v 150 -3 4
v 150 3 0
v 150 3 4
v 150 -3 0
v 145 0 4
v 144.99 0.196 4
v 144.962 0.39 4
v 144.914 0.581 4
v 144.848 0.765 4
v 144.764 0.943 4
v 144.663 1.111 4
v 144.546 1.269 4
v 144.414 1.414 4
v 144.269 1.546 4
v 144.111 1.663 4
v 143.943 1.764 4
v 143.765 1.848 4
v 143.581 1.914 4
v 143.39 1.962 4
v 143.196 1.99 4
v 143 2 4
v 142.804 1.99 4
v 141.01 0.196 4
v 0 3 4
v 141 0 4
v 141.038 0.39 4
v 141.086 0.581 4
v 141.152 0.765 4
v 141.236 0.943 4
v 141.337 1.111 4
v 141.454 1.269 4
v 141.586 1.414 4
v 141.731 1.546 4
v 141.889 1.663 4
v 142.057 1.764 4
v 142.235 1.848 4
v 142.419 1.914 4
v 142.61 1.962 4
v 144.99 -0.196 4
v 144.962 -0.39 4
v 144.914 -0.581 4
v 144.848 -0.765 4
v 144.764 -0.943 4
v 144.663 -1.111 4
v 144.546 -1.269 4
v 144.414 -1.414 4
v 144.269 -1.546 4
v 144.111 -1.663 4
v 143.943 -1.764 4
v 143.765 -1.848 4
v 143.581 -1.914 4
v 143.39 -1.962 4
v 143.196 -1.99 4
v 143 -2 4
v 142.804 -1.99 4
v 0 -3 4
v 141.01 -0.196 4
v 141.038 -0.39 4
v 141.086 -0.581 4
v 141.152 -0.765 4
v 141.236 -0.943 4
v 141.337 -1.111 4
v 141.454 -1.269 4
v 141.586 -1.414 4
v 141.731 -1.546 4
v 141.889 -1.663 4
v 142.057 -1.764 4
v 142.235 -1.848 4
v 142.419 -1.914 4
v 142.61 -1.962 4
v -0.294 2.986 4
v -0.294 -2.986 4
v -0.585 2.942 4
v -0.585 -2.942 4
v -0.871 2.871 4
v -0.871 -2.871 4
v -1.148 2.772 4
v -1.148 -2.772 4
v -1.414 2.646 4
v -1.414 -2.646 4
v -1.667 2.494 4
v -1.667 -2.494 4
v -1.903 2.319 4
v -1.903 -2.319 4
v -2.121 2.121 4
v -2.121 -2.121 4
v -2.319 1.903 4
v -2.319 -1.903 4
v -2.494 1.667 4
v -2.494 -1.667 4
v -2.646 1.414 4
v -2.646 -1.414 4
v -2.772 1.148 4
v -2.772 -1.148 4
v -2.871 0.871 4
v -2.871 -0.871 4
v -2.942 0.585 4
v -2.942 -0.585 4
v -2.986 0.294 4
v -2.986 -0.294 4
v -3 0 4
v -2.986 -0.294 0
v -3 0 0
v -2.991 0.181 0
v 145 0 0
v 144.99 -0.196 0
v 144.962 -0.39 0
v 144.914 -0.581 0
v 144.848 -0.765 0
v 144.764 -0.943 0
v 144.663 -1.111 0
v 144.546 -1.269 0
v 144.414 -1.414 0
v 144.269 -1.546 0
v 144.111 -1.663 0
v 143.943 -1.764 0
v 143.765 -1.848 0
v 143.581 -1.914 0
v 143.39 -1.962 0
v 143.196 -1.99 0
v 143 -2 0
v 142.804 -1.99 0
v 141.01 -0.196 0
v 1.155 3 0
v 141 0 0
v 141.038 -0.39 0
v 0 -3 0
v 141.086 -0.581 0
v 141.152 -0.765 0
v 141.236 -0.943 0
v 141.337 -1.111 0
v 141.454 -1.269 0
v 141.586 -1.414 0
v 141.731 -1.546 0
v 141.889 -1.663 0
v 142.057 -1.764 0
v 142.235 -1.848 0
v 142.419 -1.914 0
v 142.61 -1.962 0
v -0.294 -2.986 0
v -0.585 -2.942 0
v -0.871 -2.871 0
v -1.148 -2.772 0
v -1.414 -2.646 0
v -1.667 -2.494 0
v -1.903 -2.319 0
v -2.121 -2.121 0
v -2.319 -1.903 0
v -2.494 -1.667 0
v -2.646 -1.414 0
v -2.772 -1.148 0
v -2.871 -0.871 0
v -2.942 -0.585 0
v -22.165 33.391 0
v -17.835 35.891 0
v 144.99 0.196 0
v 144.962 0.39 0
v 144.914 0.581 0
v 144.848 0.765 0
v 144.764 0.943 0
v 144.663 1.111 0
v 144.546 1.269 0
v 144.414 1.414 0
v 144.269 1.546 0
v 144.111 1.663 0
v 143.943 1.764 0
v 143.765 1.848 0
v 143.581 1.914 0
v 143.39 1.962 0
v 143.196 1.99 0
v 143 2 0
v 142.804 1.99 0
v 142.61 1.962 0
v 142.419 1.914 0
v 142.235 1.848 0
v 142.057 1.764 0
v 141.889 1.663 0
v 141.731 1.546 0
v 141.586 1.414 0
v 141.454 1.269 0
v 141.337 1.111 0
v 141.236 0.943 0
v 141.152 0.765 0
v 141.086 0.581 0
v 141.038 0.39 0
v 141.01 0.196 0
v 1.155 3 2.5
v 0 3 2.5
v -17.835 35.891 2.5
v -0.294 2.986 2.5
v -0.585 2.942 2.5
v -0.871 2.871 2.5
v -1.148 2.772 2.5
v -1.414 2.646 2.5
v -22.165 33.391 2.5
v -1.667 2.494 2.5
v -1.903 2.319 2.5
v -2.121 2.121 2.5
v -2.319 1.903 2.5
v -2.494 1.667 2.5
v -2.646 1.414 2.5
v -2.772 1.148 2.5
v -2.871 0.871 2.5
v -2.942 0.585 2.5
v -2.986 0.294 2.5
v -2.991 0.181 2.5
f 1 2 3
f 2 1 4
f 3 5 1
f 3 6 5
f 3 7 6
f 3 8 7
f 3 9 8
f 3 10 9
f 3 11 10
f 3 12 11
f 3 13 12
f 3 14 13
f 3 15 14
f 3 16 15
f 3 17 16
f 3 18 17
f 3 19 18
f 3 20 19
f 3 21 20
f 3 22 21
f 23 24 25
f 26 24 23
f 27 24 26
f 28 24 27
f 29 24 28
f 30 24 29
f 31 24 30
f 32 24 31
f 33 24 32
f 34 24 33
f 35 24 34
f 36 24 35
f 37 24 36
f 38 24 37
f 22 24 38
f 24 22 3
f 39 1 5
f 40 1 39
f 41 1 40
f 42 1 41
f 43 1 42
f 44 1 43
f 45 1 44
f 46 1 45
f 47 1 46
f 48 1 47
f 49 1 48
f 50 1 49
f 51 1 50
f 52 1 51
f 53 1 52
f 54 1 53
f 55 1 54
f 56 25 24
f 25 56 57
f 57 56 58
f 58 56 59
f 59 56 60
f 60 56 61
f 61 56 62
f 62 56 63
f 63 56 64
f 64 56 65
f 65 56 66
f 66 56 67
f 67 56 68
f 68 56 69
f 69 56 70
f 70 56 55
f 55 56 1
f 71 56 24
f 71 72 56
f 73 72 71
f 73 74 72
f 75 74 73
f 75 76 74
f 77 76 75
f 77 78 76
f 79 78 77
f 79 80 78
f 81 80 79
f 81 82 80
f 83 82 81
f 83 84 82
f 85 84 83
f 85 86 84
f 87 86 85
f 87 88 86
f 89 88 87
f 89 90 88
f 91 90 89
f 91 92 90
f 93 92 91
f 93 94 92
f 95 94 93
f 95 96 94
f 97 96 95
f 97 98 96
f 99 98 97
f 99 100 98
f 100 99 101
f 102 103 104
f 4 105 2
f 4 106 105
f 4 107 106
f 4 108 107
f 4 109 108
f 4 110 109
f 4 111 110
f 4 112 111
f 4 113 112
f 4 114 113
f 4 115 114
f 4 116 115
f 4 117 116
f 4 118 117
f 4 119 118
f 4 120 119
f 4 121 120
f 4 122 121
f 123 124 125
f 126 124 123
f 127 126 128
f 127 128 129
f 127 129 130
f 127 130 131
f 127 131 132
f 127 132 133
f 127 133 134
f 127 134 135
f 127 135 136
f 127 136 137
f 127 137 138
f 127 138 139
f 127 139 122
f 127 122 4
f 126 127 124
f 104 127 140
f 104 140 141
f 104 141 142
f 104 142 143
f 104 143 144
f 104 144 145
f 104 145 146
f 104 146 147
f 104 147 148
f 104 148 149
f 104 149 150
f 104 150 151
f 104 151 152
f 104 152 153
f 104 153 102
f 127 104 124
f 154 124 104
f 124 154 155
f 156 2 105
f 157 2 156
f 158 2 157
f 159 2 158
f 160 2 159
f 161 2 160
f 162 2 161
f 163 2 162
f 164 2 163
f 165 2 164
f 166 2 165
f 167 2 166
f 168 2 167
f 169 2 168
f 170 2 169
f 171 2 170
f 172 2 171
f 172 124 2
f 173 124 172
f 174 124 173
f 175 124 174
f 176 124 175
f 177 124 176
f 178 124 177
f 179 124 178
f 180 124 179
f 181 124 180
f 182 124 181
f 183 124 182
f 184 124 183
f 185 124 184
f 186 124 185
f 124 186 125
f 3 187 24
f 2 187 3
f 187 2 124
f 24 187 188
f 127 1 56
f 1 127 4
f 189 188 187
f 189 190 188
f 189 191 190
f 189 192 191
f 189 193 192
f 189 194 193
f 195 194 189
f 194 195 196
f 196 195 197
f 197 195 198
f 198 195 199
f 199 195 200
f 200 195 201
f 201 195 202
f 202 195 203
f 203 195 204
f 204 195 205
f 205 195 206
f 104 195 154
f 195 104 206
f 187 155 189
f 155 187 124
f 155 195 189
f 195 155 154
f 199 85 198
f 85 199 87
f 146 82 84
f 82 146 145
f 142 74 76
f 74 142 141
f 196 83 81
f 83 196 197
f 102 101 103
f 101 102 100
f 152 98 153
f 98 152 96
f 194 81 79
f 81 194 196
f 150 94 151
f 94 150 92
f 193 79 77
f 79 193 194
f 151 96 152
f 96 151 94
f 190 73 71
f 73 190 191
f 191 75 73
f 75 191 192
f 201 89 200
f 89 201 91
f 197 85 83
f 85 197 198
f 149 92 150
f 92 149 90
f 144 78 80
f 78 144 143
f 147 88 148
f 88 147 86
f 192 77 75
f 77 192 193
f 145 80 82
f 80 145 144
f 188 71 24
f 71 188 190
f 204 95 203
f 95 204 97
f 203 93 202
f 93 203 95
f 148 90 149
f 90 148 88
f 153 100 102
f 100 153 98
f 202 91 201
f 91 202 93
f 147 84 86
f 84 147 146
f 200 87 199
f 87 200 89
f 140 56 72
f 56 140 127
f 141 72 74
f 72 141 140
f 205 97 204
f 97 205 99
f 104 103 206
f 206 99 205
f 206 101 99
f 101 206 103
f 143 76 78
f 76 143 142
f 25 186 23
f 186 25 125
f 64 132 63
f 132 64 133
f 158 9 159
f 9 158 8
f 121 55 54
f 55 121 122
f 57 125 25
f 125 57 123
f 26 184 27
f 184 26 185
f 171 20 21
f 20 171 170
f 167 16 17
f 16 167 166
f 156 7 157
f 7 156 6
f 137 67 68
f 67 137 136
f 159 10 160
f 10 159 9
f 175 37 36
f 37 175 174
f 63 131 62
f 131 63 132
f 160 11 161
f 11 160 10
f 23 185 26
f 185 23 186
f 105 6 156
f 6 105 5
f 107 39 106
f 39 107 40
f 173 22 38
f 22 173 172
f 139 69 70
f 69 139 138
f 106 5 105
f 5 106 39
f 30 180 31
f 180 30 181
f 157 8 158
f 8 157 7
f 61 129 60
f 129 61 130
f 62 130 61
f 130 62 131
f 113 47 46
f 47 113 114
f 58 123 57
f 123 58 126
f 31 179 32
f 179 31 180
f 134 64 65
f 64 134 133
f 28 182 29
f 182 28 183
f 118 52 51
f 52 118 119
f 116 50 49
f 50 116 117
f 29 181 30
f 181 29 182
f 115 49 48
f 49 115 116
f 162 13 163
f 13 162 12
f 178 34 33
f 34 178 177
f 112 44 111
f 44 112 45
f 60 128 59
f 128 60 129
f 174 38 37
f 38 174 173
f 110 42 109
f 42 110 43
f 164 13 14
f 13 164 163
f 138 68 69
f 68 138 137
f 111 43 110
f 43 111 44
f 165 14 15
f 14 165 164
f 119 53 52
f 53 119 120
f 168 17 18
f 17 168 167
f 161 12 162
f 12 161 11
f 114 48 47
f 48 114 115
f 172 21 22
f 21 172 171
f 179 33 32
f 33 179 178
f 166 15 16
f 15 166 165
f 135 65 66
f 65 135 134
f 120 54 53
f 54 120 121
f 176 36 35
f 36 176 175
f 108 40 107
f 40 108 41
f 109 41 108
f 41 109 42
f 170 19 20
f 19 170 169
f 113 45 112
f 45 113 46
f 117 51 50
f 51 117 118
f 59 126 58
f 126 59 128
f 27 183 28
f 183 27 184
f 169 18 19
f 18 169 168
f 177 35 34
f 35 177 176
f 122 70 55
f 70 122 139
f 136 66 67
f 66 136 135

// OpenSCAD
// --- Dimensions (mm) ---
handle_length = 150;      // Length of the handle bar
handle_width = 6;         // Width of the handle bar
handle_thickness = 4;     // Thickness of the handle bar
foot_length = 40;         // Length of the spreading foot
foot_width = 5;           // Width of the spreading foot
foot_thickness = 2.5;     // Thickness of the spreading foot (agar side)
boss_diameter = 6;        // Diameter of the joining boss
boss_height = 4;          // Height of the joining boss
hole_diameter = 4;        // Diameter of the hanging hole
hole_x_pos = 143;         // X position of the hanging hole
angle_deg = 120;          // Angle between handle and foot (counter-clockwise from +X)

// --- Constants ---
$fn = 64;                 // Smoothness for cylinders/circles

// --- Part Construction ---

// The part is built using a difference to subtract the hole from the solid body.
difference() {
    // 1. The Solid Body
    union() {
        // Handle: x = 0 to 150, y = -3 to 3, z = 0 to 4
        // We translate by [0, -handle_width/2, 0] to center the width on Y=0
        translate([0, -handle_width/2, 0])
            cube([handle_length, handle_width, handle_thickness]);

        // Spreading Foot: 40mm long, 5mm wide, 2.5mm thick.
        // Center line starts at origin and points 120 degrees from +X.
        // To ensure the foot is centered on its own width, we translate it.
        rotate([0, 0, angle_deg])
            translate([0, -foot_width/2, 0])
                cube([foot_length, foot_width, foot_thickness]);

        // Boss: 6mm diameter, 4mm tall at the origin.
        // Centered on X and Y to join the bars.
        translate([0, 0, 0])
            cylinder(h = boss_height, d = boss_diameter);
    }

    // 2. The Hanging Hole
    // 4mm diameter through the handle at x = 143, y = 0.
    // We extend the cylinder slightly in Z and X/Y to ensure a clean cut.
    translate([hole_x_pos, 0, -1])
        cylinder(h = handle_thickness + 2, d = hole_diameter);
}

// Note on Geometry:
// The handle is defined from x=0 to 150.
// The foot starts at the origin (0,0) and extends at 120 degrees.
// The boss is centered at (0,0) to bridge the intersection.
// The hole is at x=143, y=0.
